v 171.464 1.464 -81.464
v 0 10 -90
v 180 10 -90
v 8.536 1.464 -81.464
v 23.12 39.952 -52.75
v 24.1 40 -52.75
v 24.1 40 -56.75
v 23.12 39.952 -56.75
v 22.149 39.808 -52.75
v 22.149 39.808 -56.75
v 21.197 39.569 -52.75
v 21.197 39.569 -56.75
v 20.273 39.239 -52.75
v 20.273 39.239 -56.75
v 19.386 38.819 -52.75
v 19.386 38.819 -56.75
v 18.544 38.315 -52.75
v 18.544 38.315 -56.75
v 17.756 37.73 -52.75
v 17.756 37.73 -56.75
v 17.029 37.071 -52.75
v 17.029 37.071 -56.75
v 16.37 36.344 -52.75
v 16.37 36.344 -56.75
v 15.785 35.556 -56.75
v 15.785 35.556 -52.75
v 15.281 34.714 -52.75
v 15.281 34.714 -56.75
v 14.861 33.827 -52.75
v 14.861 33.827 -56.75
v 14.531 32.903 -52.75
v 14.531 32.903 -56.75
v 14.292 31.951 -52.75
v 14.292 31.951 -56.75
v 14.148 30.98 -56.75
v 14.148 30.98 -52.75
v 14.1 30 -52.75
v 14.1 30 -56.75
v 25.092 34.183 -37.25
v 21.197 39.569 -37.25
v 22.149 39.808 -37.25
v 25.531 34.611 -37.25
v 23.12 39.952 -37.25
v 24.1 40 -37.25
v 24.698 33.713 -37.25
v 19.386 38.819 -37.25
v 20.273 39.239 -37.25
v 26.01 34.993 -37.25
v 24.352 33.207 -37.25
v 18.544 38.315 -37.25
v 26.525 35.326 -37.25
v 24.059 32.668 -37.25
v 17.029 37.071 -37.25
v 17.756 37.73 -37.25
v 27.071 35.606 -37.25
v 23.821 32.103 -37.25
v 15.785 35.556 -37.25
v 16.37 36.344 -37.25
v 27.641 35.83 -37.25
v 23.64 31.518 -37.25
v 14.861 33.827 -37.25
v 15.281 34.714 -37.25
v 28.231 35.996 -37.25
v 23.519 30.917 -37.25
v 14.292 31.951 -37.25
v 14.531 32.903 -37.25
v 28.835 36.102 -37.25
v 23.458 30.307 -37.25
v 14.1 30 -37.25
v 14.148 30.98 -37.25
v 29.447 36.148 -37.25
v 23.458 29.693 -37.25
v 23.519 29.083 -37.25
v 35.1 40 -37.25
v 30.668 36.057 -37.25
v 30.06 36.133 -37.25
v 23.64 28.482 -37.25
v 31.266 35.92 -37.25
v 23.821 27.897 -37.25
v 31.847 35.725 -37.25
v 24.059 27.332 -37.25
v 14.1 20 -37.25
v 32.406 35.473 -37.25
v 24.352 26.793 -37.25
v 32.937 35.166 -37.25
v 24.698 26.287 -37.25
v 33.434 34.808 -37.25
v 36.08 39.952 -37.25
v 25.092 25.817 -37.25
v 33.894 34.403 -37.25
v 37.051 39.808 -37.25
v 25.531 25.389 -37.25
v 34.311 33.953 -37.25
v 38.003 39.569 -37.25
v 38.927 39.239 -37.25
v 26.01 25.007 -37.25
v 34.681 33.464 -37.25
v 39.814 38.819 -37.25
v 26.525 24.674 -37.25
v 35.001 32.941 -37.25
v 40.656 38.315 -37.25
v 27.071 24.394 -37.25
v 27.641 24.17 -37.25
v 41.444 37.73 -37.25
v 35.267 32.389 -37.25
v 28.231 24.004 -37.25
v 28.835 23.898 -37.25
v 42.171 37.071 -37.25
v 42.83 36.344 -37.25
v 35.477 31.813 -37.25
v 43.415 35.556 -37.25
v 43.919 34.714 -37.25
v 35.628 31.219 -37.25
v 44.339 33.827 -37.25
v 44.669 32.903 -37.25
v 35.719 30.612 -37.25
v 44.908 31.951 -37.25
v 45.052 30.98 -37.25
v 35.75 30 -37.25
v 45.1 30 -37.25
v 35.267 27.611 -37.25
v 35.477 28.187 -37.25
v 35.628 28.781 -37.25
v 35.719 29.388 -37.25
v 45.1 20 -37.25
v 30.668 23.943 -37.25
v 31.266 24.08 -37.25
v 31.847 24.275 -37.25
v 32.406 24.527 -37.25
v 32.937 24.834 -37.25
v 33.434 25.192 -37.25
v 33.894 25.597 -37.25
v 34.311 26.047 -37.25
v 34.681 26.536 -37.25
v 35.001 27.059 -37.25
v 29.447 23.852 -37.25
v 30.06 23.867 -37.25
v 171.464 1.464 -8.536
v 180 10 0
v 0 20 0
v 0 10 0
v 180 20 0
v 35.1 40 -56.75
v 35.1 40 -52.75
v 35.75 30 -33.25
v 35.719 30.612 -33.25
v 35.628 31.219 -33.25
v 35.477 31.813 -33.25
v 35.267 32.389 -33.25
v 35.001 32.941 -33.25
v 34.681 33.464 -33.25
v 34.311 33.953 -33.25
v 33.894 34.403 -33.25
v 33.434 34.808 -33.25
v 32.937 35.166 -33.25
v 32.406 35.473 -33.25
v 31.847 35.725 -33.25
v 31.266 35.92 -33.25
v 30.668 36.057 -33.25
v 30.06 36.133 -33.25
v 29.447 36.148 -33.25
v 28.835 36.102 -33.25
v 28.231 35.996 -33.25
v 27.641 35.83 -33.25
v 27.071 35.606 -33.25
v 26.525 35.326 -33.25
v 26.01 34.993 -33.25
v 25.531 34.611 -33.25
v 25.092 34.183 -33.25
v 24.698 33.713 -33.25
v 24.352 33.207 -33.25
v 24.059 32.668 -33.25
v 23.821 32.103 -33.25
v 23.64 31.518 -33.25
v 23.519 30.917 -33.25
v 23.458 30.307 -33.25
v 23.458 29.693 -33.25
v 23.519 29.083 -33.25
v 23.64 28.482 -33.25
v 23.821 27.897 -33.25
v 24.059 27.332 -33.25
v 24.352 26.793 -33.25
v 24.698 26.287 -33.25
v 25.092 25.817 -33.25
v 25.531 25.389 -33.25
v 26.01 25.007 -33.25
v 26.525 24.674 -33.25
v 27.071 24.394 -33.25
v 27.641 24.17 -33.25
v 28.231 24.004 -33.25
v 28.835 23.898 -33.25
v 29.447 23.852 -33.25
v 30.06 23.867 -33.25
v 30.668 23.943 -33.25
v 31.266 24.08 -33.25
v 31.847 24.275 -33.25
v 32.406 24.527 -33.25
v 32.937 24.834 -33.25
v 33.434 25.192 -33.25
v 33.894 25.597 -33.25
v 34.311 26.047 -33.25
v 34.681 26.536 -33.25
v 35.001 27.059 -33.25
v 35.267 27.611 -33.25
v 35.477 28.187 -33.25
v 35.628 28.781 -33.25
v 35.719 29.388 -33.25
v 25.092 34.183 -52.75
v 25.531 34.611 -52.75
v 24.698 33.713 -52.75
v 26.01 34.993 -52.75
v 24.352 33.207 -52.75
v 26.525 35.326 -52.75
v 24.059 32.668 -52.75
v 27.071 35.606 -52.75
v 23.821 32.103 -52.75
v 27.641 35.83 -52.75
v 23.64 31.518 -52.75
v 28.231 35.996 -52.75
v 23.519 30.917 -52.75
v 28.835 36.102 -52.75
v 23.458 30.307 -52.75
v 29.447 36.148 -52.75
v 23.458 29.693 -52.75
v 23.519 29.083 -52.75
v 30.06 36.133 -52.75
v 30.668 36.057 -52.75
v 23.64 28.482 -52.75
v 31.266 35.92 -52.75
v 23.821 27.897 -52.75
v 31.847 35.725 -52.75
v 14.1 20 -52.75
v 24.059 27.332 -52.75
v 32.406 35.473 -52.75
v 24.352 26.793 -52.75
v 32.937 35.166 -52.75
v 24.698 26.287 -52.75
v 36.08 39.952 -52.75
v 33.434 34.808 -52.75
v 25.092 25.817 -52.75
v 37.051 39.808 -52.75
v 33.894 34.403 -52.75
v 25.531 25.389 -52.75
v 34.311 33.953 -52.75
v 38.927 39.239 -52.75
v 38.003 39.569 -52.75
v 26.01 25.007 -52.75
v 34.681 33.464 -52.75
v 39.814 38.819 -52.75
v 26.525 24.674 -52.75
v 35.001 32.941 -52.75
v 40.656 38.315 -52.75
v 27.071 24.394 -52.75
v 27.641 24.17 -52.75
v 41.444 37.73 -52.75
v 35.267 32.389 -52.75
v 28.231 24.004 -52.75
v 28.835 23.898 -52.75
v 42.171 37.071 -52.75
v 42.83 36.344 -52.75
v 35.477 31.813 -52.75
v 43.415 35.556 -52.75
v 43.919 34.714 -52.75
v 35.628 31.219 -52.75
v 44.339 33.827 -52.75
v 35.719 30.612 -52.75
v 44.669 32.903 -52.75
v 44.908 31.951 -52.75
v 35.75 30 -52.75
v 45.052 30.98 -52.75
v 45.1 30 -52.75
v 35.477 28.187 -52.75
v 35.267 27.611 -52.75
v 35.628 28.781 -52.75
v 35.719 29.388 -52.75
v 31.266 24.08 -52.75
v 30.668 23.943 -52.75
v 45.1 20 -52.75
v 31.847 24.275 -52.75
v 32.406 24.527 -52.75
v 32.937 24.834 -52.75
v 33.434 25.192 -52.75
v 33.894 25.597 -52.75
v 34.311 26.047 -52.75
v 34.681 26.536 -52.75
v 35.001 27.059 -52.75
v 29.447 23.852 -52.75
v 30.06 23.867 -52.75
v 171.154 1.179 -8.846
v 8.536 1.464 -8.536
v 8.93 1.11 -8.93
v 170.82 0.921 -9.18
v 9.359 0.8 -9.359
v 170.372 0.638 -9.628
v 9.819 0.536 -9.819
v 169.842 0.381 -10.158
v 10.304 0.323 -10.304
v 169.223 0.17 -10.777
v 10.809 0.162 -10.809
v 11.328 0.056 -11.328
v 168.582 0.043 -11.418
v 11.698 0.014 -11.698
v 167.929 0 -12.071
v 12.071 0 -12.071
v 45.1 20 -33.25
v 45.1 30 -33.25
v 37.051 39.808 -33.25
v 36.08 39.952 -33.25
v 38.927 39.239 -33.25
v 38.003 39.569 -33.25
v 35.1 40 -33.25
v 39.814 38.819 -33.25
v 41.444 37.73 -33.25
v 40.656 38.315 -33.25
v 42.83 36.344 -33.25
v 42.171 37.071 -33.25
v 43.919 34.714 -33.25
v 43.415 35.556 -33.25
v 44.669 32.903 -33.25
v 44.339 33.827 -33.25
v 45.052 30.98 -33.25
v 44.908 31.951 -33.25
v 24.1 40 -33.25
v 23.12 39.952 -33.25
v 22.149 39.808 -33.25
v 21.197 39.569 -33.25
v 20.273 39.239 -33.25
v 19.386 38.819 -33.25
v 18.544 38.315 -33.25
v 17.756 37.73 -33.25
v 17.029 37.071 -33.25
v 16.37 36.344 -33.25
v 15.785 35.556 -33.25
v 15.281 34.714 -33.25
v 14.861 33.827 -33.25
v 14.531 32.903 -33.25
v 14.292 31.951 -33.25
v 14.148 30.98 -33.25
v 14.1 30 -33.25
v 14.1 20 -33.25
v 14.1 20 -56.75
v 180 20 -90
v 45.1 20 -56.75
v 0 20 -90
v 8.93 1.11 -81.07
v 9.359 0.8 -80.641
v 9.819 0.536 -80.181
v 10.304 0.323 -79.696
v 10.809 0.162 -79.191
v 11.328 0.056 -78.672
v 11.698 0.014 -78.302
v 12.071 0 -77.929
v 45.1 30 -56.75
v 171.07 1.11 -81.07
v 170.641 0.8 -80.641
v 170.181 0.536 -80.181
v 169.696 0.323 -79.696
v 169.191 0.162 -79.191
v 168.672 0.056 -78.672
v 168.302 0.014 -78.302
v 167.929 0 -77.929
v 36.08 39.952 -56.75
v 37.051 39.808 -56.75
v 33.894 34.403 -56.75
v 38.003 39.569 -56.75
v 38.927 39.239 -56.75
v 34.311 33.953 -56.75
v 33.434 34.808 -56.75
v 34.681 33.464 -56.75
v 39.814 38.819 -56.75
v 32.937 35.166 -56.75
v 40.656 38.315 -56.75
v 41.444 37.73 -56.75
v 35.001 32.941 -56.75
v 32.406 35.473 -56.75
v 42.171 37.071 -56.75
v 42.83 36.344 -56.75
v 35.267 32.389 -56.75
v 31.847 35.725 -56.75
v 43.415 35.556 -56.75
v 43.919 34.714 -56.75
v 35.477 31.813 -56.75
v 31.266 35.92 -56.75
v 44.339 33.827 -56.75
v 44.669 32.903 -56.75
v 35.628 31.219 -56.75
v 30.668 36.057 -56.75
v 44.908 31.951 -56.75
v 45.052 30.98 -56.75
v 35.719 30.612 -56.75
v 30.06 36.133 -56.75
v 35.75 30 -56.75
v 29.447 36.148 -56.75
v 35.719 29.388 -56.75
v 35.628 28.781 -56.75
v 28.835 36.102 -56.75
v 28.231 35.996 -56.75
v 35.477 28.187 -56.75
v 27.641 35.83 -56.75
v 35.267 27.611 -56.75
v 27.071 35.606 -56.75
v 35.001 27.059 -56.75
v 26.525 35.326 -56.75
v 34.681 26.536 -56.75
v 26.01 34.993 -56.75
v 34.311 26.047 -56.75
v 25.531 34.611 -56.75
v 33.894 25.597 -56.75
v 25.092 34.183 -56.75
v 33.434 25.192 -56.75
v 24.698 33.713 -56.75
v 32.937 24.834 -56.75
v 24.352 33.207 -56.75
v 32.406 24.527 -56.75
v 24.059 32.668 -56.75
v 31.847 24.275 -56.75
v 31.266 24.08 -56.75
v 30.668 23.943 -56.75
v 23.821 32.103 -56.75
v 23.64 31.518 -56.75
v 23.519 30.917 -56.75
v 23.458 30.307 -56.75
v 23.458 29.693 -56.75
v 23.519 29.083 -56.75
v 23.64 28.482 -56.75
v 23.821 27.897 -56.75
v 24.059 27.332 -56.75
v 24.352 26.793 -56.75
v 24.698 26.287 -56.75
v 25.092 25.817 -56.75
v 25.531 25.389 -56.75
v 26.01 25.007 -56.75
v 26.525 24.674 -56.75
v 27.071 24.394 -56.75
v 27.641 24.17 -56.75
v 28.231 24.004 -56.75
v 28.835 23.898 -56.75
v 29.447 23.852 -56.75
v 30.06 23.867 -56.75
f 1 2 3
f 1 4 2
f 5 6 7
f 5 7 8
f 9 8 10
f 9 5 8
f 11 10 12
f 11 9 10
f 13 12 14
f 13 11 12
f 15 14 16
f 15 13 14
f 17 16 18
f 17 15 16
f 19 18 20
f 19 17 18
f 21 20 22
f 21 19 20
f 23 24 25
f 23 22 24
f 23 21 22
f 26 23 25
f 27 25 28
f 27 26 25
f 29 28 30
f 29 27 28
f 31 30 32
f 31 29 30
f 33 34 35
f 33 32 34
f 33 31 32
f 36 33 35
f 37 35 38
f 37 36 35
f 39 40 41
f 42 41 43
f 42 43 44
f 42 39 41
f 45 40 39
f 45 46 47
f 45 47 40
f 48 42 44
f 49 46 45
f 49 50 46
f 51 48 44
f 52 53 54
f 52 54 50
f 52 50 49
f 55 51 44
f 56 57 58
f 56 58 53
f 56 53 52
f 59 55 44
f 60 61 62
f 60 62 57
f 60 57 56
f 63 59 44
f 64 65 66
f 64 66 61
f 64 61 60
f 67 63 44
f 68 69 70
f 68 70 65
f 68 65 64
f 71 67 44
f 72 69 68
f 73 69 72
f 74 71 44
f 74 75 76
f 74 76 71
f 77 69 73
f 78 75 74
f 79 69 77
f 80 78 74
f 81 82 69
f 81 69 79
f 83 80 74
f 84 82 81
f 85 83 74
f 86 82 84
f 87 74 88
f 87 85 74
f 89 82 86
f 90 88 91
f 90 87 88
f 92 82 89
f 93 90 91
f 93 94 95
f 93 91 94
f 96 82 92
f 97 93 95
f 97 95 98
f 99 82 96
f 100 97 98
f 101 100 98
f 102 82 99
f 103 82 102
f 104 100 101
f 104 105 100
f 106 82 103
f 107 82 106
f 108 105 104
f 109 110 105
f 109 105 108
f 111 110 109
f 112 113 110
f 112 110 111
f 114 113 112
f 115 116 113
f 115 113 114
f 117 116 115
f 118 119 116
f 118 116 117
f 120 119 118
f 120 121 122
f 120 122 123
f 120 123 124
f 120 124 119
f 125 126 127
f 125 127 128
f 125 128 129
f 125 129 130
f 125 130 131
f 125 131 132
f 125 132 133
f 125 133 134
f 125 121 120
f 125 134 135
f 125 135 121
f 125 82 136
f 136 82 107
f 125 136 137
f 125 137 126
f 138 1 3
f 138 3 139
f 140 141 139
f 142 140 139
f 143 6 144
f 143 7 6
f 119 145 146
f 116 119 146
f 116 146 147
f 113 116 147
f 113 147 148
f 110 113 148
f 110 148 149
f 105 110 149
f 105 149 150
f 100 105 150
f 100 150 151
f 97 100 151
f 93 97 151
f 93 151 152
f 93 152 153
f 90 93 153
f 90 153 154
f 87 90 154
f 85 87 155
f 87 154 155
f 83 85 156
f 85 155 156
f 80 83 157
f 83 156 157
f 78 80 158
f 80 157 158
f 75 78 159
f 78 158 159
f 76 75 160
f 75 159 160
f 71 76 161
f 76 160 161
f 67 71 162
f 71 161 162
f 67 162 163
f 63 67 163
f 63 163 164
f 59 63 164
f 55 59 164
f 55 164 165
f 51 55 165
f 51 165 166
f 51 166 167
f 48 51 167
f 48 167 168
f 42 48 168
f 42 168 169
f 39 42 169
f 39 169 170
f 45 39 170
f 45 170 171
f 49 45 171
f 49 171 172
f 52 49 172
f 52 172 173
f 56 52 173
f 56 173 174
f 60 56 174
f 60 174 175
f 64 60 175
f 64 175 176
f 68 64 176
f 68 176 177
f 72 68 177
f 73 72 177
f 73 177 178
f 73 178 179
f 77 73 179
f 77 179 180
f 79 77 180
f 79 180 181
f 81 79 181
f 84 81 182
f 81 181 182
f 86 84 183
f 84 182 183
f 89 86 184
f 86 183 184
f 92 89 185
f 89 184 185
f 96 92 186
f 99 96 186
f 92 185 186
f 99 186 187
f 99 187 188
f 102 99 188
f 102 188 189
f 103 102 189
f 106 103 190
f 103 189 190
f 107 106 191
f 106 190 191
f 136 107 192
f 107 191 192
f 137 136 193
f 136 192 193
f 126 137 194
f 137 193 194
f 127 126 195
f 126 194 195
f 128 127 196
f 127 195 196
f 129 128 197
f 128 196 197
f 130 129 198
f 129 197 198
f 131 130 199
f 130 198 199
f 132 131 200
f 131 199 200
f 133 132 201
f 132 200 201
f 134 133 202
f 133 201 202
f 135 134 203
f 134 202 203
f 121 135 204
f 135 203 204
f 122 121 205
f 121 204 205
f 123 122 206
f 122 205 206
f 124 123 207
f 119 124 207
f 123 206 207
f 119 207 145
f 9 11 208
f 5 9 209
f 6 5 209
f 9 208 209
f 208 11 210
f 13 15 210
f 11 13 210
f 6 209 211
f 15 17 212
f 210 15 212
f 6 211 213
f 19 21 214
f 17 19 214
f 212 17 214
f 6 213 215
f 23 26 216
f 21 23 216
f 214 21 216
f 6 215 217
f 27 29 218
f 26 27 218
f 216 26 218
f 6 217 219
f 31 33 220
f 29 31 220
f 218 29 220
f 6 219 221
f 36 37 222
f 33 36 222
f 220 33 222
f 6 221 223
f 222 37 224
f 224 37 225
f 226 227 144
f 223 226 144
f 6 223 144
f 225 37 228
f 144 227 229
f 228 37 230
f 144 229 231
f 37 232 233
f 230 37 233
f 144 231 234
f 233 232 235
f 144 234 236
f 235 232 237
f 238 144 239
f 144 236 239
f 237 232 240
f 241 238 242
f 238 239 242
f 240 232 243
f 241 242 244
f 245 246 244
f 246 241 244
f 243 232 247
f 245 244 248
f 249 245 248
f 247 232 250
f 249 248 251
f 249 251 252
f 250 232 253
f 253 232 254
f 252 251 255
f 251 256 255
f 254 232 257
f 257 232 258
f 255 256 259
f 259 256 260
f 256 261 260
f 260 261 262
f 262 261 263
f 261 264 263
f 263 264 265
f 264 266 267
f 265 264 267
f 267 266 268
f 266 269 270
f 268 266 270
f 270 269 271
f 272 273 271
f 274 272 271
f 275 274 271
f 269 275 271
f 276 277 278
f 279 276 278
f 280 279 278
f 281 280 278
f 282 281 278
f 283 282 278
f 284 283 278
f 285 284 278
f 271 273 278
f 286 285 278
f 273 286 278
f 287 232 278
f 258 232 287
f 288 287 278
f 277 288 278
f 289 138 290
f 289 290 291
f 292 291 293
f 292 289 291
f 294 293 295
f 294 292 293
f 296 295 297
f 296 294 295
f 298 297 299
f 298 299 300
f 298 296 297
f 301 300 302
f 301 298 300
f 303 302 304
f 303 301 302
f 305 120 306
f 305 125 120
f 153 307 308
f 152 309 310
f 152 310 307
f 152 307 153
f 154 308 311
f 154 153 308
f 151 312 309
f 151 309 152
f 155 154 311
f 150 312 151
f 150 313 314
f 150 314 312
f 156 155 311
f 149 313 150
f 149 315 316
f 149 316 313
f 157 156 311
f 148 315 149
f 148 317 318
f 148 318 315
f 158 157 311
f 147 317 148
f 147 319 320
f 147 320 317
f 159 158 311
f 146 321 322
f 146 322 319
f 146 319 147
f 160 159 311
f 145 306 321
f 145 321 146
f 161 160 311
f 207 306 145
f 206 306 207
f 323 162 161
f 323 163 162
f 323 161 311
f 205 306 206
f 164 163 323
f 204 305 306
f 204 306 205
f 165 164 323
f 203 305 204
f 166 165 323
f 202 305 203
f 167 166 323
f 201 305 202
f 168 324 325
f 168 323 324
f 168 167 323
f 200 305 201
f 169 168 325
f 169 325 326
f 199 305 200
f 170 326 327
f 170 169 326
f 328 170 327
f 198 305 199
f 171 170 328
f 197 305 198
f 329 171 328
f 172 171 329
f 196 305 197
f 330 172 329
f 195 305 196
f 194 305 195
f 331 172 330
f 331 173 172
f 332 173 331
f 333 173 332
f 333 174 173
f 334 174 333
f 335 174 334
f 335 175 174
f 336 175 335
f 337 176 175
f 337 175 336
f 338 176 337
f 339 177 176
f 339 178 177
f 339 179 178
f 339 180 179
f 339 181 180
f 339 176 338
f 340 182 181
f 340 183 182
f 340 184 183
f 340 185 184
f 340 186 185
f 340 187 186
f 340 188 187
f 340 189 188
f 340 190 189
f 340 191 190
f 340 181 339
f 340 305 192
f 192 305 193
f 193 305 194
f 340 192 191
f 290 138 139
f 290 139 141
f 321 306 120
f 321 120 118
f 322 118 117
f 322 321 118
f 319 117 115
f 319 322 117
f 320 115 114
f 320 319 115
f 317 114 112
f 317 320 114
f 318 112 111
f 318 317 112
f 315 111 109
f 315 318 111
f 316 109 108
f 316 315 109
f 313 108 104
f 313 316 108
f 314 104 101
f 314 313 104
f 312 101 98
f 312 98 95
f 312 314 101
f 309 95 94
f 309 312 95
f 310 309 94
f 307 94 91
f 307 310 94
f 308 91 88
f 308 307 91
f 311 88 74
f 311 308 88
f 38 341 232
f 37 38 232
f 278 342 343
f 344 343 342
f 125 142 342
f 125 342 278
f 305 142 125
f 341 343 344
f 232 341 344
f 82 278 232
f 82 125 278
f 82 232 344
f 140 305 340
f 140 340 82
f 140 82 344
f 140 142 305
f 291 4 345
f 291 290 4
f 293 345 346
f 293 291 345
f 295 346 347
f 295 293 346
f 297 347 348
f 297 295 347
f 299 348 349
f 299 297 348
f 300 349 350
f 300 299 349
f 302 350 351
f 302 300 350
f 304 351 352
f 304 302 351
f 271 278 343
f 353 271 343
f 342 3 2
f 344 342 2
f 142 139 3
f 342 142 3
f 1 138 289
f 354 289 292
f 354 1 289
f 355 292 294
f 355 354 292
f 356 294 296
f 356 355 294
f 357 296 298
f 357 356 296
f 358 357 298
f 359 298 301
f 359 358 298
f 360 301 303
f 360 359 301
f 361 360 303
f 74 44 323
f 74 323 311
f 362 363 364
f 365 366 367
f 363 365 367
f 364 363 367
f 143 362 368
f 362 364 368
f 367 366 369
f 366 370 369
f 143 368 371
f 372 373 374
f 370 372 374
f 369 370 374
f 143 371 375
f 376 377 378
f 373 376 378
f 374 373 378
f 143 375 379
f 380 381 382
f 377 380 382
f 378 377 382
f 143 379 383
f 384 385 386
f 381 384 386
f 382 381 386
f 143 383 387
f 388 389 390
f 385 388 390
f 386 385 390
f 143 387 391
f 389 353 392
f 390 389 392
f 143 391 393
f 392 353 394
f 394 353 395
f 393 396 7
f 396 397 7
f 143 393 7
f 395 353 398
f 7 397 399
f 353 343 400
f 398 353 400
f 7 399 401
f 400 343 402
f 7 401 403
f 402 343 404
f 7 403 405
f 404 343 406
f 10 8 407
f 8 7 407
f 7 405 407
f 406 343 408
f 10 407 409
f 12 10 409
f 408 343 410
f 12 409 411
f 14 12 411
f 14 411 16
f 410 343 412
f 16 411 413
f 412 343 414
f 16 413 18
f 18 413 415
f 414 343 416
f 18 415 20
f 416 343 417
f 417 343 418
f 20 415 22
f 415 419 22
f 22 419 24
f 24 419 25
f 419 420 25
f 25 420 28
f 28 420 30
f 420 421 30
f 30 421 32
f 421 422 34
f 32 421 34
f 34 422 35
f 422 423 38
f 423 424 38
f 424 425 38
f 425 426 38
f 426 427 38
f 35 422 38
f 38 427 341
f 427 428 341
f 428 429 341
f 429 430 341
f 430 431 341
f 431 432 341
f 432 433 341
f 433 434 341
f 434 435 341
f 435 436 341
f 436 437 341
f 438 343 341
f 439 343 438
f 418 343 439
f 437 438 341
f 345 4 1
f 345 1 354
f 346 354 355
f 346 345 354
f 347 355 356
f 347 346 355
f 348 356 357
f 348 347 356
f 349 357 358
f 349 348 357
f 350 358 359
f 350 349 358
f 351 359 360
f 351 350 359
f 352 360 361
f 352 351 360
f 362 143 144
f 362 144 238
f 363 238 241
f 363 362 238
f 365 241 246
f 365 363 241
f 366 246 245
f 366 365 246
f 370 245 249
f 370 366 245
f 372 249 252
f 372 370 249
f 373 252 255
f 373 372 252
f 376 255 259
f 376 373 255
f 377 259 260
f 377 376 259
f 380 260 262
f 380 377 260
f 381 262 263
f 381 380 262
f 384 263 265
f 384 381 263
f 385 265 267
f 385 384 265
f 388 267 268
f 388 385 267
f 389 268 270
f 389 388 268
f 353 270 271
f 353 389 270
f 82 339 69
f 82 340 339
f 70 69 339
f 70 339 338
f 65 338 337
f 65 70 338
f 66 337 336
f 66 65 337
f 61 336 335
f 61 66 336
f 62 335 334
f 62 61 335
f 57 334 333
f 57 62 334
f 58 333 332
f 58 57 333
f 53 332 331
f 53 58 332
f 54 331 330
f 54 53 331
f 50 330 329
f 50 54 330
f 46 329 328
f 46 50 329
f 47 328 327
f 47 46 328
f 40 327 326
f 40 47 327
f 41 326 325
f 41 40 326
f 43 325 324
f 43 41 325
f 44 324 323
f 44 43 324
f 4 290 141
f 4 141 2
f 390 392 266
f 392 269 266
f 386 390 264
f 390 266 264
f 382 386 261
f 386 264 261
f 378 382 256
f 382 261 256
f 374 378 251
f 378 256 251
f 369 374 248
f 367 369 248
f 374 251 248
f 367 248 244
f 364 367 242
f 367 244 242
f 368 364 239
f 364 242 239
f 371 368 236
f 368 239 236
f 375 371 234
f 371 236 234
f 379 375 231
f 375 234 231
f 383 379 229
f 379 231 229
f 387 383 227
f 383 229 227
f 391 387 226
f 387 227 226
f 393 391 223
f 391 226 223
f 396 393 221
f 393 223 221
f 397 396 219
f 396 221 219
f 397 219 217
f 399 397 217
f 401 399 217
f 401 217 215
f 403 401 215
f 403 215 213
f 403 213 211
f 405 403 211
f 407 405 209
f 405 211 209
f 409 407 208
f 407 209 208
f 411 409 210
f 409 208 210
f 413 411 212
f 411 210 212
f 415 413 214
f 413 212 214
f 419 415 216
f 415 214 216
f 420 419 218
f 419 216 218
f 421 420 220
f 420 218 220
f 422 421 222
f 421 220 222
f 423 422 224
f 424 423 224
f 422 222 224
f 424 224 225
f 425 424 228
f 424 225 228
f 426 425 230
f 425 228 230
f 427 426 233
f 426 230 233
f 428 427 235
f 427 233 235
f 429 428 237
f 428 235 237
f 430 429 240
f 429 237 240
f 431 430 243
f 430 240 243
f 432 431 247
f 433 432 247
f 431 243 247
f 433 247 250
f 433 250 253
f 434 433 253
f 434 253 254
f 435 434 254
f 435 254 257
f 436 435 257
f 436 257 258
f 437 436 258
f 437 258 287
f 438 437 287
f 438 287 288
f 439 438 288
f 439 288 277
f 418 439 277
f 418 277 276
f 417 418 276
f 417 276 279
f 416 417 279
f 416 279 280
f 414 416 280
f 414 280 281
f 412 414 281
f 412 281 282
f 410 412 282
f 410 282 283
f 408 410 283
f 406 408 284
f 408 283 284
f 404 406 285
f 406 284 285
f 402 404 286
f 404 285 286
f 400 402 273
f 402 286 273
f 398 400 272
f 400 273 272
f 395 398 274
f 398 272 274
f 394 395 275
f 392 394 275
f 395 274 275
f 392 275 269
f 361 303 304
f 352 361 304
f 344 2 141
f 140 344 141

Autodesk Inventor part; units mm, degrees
ref_plane "YZ Plane" through (0, 0, 0) normal (1, 0, 0) x (0, 1, 0)
ref_plane "XZ Plane" through (0, 0, 0) normal (0, 1, 0) x (-1, 0, 0)
ref_plane "XY Plane" through (0, 0, 0) normal (0, 0, 1) x (1, 0, 0)
sketch "Esboço1" plane through (0, 0, 0) normal (0, 1, 0) x (-1, 0, 0)
  line L0 (0, 0) -> (-180, 0)
  line L1 (-180, 0) -> (-180, -90)
  line L2 (-180, -90) -> (0, -90)
  line L3 (0, -90) -> (0, 0)
  dimension "d25" = 180
extrude "Extrusão1" add sketch "Esboço1" along normal blind 20
chamfer "Chanfro1" distance 10 angle 45 4 edges at (90, 0, 0) (180, 0, -45) (90, 0, -90) (0, 0, -45)
fillet "Arredondamento1" radius 5 4 edges at (90, 0, -80) (10, 0, -45) (90, 0, -10) (170, 0, -45)
sketch "Esboço4" plane through (0, 20, 0) normal (0, 1, 0) x (1, 0, 0)
  line L0 (0, 90) -> (0, 0) projected
  line L1 (171.4645, 8.5355) -> (8.5355, 8.5355) projected
  line L2 (30, 52.75) -> (45.1, 52.75)
  line L3 (45.1, 52.75) -> (45.1, 56.75)
  line L4 (45.1, 56.75) -> (14.1, 56.75)
  line L5 (14.1, 56.75) -> (14.1, 52.75)
  line L6 (14.1, 52.75) -> (30, 52.75)
  line L7 (12.0711, 77.9289) -> (12.0711, 12.0711) projected
  line L8 (30, 37.25) -> (45.1, 37.25)
  line L9 (45.1, 37.25) -> (45.1, 33.25)
  line L10 (45.1, 33.25) -> (14.1, 33.25)
  line L11 (14.1, 33.25) -> (14.1, 37.25)
  line L12 (14.1, 37.25) -> (30, 37.25)
  dimension "d49" = 15.1
  dimension "d50" = 4
  dimension "d51" = 31
  dimension "d52" = 4
extrude "Extrusão4" add sketch "Esboço4" along normal blind 20
fillet "Arredondamento4" radius 10 4 edges at (45.1, 40, -35.25) (45.1, 40, -54.75) (14.1, 40, -54.75) (14.1, 40, -35.25)
sketch "Esboço6" plane through (14.1, 20, -33.25) normal (0, 0, 1) x (1, 0, 0)
  line L0 (21, 20) -> (10, 20) projected
  line L1 (31, 0) -> (0, 0) projected
  line L2 (0, 0) -> (0, 10) projected
  circle A0 centre (15.5, 10) radius 6.15
  point P0 (-14.1, -20)
  dimension "d54" = 12.3
extrude "Extrusão6" cut sketch "Esboço6" against normal blind 24
properties part number "base"
